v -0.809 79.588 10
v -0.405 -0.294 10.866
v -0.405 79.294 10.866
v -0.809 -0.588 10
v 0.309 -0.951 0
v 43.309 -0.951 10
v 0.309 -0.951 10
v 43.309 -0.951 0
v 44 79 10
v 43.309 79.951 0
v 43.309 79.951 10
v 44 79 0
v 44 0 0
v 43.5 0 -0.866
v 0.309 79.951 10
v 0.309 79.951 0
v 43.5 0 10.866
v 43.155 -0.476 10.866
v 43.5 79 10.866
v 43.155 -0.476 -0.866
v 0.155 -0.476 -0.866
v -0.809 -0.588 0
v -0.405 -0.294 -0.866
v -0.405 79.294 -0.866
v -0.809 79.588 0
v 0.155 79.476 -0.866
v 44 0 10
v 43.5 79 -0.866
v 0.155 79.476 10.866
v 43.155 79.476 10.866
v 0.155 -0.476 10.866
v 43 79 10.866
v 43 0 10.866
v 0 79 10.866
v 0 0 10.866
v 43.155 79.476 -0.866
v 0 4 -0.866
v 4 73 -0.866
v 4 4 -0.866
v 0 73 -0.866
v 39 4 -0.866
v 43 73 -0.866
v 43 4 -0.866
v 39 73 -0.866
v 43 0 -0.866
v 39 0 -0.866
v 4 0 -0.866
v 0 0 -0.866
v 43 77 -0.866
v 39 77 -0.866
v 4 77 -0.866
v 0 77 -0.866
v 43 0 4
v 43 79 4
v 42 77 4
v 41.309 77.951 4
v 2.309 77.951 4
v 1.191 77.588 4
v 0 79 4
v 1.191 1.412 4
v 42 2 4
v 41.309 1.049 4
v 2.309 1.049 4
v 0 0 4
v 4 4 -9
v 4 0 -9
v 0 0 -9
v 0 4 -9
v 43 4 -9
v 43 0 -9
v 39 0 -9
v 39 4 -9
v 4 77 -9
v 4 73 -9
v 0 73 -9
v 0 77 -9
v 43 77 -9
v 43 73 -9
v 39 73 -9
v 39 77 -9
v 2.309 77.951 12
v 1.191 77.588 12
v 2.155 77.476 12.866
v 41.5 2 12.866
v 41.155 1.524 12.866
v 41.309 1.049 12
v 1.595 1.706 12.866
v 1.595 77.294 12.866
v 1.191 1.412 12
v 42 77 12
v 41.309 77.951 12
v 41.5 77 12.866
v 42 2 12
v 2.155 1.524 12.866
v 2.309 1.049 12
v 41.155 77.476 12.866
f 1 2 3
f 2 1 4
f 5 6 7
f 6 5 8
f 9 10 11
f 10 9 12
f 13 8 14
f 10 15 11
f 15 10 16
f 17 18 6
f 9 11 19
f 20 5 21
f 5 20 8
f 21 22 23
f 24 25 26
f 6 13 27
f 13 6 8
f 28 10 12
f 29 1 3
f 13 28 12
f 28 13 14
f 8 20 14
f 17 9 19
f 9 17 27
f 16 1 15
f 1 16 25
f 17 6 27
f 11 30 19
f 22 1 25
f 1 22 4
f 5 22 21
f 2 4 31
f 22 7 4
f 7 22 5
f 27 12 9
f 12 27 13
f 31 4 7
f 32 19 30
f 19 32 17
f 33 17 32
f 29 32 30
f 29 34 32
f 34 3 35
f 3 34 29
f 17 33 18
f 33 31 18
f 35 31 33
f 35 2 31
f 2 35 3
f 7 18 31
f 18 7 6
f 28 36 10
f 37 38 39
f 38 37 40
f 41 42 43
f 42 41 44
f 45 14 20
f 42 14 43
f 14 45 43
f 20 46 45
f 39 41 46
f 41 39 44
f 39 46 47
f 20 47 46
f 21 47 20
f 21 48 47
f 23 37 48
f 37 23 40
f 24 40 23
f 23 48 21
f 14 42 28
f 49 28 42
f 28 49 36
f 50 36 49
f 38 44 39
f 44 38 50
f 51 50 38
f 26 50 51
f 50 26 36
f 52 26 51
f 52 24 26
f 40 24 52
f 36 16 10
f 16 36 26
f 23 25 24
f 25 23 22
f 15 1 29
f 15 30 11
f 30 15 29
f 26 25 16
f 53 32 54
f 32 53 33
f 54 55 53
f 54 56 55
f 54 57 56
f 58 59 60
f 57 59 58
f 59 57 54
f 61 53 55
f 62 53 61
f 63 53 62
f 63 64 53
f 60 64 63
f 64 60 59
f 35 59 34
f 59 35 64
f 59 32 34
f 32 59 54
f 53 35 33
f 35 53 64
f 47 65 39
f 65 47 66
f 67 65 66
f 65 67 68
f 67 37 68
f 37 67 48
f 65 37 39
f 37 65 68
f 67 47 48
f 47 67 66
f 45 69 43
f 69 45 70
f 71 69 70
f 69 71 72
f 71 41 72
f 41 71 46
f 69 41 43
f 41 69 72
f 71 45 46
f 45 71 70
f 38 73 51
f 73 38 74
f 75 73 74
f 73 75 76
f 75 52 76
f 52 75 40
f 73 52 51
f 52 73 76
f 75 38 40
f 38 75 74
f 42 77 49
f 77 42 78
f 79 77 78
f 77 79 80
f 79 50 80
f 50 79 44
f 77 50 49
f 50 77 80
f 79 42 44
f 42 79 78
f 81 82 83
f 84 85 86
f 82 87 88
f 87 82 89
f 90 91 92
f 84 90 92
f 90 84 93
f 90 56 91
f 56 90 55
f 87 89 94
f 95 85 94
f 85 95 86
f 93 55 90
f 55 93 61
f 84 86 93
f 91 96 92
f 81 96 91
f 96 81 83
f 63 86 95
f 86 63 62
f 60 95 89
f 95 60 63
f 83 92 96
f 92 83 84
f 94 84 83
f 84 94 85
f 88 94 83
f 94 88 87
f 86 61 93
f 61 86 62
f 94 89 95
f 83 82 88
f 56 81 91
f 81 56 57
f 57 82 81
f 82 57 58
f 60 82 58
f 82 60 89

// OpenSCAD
/* Global */
type = "twin"; // [twin:twin,twinXL:twinXL,full:full,fullXL:fullXL,queen:queen,king:king,calKing:calKing]
height = 10; // [1:100]

/* Hidden */ 

bed(type,height);

module bed(type,height) {
frame =
(type == "twin") ? [39,75,height] : 
(type == "twinXL") ? [39,80,height] :
type == "full" ? [54,75,height] :
(type == "fullXL") ? [54,80,height] :
(type == "queen") ? [60,80,height] :
(type == "king") ? [70,80,height] :
(type == "calKing") ? [72,84,height] : 
"error!";
echo(type);
    module frame() {
    //frame
        difference() {
            hull() {
                cube ([frame[0]+4,frame[1]+4,frame[2]]);
                translate([0,0,frame[2]]) sphere(1);
                translate([0,frame[1]+4,frame[2]]) sphere(1);
                translate([frame[0]+4,frame[1]+4,frame[2]]) sphere(1);
                translate([frame[0]+4,0,frame[2]]) sphere(1);
                translate([0,0,0]) sphere(1);
                translate([0,frame[1]+4,0]) sphere(1);
                translate([frame[0]+4,frame[1]+4,0]) sphere(1);
                translate([frame[0]+4,0,0]) sphere(1);
            }
            translate([0,0,4]) cube([frame[0]+4,frame[1]+4,frame[2]+1]);
        };
    }
    module legs() {
        //legs
         {
            translate([0,0,-9]) cube([4,4,9]);
            translate([frame[0],0,-9]) cube([4,4,9]);
            translate([0,frame[1]-2,-9]) cube([4,4,9]);
            translate([frame[0],frame[1]-2,-9]) cube([4,4,9]);
        };
    }
    module mattress() {
        //mattress
        translate([2,2,2]) {
            hull() {
                cube([frame[0],frame[1],frame[2]]);
                translate([0,0,frame[2]]) sphere(1);
                translate([0,frame[1],frame[2]]) sphere(1);
                translate([frame[0],frame[1],frame[2]]) sphere(1);
                translate([frame[0],0,frame[2]]) sphere(1);
                translate([0,0,0]) sphere(1);
                translate([0,frame[1],0]) sphere(1);
                translate([frame[0],frame[1],0]) sphere(1);
                translate([frame[0],0,0]) sphere(1);
            };
        }
    }
    color("tan") frame();
    color("tan") legs();
    color("white") mattress();
    }
